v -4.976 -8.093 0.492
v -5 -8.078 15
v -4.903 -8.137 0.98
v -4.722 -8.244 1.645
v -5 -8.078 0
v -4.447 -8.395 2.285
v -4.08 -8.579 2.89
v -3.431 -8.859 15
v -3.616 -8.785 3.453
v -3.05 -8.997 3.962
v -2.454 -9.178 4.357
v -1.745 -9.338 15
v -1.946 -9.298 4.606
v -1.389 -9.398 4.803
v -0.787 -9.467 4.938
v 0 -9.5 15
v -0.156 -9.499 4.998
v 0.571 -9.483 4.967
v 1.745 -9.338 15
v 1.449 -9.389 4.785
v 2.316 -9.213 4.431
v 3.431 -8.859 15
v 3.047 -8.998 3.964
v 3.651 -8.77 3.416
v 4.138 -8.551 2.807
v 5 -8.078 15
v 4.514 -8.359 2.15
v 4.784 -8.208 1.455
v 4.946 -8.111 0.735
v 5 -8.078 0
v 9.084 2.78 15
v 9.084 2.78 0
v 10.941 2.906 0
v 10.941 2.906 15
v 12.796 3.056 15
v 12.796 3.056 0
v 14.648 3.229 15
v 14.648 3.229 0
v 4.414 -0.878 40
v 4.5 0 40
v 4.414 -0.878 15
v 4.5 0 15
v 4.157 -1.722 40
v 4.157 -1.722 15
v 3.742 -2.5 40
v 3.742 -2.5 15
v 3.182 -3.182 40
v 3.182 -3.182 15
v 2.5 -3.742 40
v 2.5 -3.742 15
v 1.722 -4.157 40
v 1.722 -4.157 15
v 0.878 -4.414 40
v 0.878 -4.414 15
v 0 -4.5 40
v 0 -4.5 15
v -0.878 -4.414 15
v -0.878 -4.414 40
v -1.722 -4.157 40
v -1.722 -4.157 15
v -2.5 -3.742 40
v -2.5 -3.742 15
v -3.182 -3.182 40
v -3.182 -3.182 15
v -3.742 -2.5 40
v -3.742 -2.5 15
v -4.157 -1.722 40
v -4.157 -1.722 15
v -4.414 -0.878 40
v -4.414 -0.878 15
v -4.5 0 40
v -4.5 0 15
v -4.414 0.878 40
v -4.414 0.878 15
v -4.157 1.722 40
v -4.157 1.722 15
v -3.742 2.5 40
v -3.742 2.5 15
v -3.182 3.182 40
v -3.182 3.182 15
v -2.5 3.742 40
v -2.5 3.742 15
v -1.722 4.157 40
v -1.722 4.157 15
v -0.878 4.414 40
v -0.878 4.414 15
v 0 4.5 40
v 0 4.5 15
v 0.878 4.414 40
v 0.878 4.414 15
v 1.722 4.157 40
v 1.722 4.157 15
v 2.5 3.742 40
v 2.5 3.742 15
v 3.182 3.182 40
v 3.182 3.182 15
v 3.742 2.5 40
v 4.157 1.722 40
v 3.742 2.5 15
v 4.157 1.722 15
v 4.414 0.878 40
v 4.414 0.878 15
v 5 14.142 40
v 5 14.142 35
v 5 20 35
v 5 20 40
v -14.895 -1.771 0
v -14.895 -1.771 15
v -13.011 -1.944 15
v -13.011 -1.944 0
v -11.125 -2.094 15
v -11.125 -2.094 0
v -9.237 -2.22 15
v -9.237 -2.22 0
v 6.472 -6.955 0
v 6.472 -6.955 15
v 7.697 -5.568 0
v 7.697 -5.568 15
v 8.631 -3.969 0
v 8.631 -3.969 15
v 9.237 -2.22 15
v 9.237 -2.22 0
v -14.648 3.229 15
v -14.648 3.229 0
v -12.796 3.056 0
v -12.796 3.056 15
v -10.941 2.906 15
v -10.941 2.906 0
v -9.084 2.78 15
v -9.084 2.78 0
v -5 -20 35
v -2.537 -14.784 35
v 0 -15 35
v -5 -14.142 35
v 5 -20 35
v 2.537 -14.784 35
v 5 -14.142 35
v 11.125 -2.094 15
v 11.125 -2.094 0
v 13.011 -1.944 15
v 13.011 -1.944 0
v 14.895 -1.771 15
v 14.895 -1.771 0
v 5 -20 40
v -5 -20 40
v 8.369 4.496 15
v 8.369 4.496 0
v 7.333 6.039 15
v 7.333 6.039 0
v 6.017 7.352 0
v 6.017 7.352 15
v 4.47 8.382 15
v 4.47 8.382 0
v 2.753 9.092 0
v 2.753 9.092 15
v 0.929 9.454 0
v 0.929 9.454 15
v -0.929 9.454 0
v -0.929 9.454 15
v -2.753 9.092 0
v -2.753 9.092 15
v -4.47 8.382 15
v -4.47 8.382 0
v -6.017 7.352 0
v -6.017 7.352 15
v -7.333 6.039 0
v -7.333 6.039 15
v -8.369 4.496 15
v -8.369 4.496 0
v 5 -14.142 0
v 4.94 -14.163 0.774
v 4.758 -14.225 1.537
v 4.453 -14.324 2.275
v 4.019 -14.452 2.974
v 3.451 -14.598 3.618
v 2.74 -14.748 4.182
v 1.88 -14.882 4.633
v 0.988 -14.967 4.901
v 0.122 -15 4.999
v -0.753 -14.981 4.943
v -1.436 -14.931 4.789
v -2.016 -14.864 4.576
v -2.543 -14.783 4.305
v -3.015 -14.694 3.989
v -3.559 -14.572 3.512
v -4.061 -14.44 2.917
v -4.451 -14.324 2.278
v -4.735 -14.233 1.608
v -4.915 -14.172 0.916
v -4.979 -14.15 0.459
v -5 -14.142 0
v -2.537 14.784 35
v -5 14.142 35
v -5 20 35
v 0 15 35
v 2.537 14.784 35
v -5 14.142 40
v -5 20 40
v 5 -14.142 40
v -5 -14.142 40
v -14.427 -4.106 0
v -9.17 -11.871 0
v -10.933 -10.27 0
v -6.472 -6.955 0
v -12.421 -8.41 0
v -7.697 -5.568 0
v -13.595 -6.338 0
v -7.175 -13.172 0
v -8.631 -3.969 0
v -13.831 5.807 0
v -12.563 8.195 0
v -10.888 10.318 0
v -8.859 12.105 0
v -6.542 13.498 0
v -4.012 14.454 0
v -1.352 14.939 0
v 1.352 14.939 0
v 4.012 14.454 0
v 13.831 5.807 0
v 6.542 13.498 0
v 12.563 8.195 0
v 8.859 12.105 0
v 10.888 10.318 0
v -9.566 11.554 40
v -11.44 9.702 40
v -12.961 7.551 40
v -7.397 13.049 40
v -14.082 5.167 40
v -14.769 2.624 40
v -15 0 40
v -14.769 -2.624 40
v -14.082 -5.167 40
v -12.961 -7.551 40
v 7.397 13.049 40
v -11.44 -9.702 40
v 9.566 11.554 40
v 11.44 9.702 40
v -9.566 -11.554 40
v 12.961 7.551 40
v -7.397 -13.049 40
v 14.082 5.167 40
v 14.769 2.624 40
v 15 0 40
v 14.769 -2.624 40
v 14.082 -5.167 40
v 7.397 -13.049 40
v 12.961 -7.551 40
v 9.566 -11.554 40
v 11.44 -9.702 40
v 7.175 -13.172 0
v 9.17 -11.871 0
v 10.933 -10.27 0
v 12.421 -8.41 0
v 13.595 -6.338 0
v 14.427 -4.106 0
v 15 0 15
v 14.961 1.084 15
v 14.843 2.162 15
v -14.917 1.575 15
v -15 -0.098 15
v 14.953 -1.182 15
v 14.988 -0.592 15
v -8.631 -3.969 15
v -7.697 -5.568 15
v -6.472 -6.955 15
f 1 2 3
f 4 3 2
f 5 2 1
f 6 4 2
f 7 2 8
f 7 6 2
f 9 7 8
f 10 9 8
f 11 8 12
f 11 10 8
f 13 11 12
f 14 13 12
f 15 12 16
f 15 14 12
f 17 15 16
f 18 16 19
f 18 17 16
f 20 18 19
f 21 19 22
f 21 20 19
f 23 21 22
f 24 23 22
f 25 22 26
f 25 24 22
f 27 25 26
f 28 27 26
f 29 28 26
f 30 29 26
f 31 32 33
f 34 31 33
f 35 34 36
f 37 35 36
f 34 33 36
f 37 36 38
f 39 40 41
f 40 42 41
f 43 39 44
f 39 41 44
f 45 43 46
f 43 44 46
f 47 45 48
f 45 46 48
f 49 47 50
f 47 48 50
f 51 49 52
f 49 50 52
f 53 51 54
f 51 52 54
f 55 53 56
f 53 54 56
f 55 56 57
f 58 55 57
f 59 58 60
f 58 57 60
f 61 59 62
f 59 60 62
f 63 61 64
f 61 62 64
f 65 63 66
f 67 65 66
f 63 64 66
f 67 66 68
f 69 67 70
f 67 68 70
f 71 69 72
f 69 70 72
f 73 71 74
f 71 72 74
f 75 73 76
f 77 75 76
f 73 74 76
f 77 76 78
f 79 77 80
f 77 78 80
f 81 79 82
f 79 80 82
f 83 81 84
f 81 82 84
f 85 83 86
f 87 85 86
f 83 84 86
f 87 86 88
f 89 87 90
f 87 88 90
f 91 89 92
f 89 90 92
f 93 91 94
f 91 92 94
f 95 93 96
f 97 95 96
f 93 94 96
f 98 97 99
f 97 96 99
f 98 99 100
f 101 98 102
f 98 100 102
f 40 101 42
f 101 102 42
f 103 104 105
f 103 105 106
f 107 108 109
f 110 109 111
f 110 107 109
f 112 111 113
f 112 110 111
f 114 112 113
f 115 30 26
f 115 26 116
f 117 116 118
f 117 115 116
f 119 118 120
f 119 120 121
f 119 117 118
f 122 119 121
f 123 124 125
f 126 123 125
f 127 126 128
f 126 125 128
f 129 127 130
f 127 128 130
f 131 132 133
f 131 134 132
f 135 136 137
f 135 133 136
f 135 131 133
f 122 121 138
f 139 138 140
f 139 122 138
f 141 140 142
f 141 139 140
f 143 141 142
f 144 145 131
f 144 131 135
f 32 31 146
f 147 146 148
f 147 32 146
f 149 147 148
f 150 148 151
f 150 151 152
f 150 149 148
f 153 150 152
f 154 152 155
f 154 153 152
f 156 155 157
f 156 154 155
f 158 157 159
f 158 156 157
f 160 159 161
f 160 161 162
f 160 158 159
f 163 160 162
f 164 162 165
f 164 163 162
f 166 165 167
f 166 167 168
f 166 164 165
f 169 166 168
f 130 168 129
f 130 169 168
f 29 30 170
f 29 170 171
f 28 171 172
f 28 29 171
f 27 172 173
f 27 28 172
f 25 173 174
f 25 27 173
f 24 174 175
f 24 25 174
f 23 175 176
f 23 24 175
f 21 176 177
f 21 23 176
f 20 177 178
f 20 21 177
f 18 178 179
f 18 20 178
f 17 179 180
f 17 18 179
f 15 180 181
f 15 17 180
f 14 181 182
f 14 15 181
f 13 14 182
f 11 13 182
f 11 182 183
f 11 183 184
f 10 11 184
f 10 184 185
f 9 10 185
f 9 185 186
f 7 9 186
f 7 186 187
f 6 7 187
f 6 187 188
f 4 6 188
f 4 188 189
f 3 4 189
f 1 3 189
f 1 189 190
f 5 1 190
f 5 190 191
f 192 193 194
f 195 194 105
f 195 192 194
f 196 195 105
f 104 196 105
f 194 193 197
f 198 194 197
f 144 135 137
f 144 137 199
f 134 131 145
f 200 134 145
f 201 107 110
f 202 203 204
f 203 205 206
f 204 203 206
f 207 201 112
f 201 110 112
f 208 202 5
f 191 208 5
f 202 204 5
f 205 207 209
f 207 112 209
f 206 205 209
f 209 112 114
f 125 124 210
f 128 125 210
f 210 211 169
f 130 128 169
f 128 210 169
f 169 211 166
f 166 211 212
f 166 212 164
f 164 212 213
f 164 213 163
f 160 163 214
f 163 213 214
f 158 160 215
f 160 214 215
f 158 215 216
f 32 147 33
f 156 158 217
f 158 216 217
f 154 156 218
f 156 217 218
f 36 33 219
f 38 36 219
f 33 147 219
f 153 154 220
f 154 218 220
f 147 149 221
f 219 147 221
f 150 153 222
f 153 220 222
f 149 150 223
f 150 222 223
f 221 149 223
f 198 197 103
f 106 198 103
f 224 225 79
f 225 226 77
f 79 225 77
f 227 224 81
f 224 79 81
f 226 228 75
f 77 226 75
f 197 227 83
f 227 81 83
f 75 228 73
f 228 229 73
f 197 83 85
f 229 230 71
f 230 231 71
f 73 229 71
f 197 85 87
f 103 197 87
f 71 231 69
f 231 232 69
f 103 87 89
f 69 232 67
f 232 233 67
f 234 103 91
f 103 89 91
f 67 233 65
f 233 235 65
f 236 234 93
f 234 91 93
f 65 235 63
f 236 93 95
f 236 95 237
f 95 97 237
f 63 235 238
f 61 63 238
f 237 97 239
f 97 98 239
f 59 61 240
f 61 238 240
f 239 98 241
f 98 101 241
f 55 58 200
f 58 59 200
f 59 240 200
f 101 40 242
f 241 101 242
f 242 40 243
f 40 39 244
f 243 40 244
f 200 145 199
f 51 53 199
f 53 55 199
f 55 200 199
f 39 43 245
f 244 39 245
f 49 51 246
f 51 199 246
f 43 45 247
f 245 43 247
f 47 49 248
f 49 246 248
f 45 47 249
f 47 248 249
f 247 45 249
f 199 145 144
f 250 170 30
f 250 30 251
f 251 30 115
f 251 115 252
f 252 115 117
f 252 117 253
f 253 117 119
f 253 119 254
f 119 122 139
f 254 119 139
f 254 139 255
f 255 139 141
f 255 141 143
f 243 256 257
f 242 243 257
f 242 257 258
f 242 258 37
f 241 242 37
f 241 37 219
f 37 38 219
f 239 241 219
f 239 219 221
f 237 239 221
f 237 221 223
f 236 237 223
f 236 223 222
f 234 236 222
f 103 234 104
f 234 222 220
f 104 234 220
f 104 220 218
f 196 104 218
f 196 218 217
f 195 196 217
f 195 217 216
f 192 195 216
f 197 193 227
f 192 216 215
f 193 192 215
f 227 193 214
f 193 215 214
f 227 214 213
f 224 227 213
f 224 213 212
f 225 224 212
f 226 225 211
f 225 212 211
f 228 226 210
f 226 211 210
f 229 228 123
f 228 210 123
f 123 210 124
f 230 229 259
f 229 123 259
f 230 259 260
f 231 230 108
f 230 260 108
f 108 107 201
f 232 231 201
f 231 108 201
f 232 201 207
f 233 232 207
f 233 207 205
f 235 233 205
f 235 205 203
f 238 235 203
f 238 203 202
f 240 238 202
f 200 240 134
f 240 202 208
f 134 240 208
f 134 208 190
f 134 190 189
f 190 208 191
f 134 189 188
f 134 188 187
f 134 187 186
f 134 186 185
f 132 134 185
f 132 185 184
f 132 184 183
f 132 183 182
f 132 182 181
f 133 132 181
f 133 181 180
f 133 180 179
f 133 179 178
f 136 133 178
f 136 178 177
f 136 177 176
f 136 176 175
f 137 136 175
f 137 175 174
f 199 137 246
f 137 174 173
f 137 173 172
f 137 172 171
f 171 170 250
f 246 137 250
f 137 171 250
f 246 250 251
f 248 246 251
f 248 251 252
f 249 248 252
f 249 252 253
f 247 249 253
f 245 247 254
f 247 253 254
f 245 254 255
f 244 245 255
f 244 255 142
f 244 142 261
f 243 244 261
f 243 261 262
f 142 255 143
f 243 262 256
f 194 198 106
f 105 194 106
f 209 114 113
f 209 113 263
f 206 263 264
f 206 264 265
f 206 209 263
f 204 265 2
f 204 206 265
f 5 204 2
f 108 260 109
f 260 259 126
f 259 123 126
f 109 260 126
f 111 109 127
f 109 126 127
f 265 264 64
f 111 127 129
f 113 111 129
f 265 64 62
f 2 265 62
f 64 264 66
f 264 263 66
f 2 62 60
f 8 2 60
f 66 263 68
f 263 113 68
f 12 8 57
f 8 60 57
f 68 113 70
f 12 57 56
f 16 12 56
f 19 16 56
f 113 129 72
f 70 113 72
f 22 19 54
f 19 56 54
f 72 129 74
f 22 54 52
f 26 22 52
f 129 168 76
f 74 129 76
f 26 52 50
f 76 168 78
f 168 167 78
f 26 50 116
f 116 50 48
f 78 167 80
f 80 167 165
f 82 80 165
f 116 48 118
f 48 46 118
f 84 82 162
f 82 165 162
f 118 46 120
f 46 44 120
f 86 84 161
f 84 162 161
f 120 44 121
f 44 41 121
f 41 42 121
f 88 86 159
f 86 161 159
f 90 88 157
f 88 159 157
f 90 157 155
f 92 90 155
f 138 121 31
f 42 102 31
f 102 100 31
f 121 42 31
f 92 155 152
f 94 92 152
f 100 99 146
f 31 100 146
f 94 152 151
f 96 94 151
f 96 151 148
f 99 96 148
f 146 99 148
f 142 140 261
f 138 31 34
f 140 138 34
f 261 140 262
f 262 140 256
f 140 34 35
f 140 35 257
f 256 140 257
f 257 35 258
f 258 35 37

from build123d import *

# Parameters (mm, degrees)
F0_R     = 15
F1_DEPTH = 40
F2_W     = 10
F2_H     = 5
F3_DEPTH = 20
F4_DEPTH = 15
F5_R     = 5
F6_DEPTH = 25
F7_R     = 152.5
F7_R_2   = 147.5
F8_DEPTH = 15
F9_DEPTH = 25


with BuildPart() as f1:
    # F0 (on Top) → F1 (new body)
    with BuildSketch(Plane.XY):
        Circle(F0_R)
        with BuildLine():
            ThreePointArc((9.5, 0), (8.2990963363, -4.6233105022), (5, -8.0777472107))
            ThreePointArc((5, -8.0777472107), (0, -9.5), (-5, -8.0777472107))
            ThreePointArc((-5, -8.0777472107), (-4.6233105022, 8.2990963363), (9.5, 0))
        make_face(mode=Mode.SUBTRACT)
        with BuildLine():
            ThreePointArc((-4.5, 0), (0, 4.5), (4.5, 0))
            Line((4.5, 0), (5, 0))
            Line((5, 0), (5, -8.0777472107))
            ThreePointArc((5, -8.0777472107), (8.2990963363, -4.6233105022), (9.5, 0))
            ThreePointArc((9.5, 0), (-4.6233105022, 8.2990963363), (-5, -8.0777472107))
            Line((-5, -8.0777472107), (-5, 0))
            Line((-5, 0), (-4.5, 0))
        make_face()
        with BuildLine():
            Line((5, 0), (4.5, 0))
            ThreePointArc((4.5, 0), (0, -4.5), (-4.5, 0))
            Line((-4.5, 0), (-5, 0))
            Line((-5, 0), (-5, -8.0777472107))
            ThreePointArc((-5, -8.0777472107), (0, -9.5), (5, -8.0777472107))
            Line((5, -8.0777472107), (5, 0))
        make_face()
    extrude(amount=F1_DEPTH)

    # F2 (on Front) → F3 (join, symmetric)
    with BuildSketch(Plane.XZ):
        with Locations((0, 37.5)):
            Rectangle(F2_W, F2_H)
    extrude(amount=F3_DEPTH, both=True)

    # F0 (on Top) → F4 (cut)
    with BuildSketch(Plane.XY):
        with BuildLine():
            ThreePointArc((-4.5, 0), (0, 4.5), (4.5, 0))
            Line((4.5, 0), (5, 0))
            Line((5, 0), (5, -8.0777472107))
            ThreePointArc((5, -8.0777472107), (8.2990963363, -4.6233105022), (9.5, 0))
            ThreePointArc((9.5, 0), (-4.6233105022, 8.2990963363), (-5, -8.0777472107))
            Line((-5, -8.0777472107), (-5, 0))
            Line((-5, 0), (-4.5, 0))
        make_face()
        with BuildLine():
            Line((5, 0), (4.5, 0))
            ThreePointArc((4.5, 0), (0, -4.5), (-4.5, 0))
            Line((-4.5, 0), (-5, 0))
            Line((-5, 0), (-5, -8.0777472107))
            ThreePointArc((-5, -8.0777472107), (0, -9.5), (5, -8.0777472107))
            Line((5, -8.0777472107), (5, 0))
        make_face()
    extrude(amount=F4_DEPTH, mode=Mode.SUBTRACT)

    # F5 (on Front) → F6 (cut)
    with BuildSketch(Plane.XZ):
        Circle(F5_R)
    extrude(amount=F6_DEPTH, mode=Mode.SUBTRACT)

    # F7 (on Top) → F8 (cut)
    with BuildSketch(Plane.XY):
        with Locations((0, 150)):
            Circle(F7_R)
        with Locations((0, 150)):
            Circle(F7_R_2, mode=Mode.SUBTRACT)
    extrude(amount=F8_DEPTH, mode=Mode.SUBTRACT)

    # F9 (cut): a face of the model
    f9_faces = [f1.faces().sort_by_distance(p)[0] for p in [
        (0, 0, 35),
    ]]
    extrude(f9_faces, amount=-F9_DEPTH, mode=Mode.SUBTRACT)


solid = f1.part
